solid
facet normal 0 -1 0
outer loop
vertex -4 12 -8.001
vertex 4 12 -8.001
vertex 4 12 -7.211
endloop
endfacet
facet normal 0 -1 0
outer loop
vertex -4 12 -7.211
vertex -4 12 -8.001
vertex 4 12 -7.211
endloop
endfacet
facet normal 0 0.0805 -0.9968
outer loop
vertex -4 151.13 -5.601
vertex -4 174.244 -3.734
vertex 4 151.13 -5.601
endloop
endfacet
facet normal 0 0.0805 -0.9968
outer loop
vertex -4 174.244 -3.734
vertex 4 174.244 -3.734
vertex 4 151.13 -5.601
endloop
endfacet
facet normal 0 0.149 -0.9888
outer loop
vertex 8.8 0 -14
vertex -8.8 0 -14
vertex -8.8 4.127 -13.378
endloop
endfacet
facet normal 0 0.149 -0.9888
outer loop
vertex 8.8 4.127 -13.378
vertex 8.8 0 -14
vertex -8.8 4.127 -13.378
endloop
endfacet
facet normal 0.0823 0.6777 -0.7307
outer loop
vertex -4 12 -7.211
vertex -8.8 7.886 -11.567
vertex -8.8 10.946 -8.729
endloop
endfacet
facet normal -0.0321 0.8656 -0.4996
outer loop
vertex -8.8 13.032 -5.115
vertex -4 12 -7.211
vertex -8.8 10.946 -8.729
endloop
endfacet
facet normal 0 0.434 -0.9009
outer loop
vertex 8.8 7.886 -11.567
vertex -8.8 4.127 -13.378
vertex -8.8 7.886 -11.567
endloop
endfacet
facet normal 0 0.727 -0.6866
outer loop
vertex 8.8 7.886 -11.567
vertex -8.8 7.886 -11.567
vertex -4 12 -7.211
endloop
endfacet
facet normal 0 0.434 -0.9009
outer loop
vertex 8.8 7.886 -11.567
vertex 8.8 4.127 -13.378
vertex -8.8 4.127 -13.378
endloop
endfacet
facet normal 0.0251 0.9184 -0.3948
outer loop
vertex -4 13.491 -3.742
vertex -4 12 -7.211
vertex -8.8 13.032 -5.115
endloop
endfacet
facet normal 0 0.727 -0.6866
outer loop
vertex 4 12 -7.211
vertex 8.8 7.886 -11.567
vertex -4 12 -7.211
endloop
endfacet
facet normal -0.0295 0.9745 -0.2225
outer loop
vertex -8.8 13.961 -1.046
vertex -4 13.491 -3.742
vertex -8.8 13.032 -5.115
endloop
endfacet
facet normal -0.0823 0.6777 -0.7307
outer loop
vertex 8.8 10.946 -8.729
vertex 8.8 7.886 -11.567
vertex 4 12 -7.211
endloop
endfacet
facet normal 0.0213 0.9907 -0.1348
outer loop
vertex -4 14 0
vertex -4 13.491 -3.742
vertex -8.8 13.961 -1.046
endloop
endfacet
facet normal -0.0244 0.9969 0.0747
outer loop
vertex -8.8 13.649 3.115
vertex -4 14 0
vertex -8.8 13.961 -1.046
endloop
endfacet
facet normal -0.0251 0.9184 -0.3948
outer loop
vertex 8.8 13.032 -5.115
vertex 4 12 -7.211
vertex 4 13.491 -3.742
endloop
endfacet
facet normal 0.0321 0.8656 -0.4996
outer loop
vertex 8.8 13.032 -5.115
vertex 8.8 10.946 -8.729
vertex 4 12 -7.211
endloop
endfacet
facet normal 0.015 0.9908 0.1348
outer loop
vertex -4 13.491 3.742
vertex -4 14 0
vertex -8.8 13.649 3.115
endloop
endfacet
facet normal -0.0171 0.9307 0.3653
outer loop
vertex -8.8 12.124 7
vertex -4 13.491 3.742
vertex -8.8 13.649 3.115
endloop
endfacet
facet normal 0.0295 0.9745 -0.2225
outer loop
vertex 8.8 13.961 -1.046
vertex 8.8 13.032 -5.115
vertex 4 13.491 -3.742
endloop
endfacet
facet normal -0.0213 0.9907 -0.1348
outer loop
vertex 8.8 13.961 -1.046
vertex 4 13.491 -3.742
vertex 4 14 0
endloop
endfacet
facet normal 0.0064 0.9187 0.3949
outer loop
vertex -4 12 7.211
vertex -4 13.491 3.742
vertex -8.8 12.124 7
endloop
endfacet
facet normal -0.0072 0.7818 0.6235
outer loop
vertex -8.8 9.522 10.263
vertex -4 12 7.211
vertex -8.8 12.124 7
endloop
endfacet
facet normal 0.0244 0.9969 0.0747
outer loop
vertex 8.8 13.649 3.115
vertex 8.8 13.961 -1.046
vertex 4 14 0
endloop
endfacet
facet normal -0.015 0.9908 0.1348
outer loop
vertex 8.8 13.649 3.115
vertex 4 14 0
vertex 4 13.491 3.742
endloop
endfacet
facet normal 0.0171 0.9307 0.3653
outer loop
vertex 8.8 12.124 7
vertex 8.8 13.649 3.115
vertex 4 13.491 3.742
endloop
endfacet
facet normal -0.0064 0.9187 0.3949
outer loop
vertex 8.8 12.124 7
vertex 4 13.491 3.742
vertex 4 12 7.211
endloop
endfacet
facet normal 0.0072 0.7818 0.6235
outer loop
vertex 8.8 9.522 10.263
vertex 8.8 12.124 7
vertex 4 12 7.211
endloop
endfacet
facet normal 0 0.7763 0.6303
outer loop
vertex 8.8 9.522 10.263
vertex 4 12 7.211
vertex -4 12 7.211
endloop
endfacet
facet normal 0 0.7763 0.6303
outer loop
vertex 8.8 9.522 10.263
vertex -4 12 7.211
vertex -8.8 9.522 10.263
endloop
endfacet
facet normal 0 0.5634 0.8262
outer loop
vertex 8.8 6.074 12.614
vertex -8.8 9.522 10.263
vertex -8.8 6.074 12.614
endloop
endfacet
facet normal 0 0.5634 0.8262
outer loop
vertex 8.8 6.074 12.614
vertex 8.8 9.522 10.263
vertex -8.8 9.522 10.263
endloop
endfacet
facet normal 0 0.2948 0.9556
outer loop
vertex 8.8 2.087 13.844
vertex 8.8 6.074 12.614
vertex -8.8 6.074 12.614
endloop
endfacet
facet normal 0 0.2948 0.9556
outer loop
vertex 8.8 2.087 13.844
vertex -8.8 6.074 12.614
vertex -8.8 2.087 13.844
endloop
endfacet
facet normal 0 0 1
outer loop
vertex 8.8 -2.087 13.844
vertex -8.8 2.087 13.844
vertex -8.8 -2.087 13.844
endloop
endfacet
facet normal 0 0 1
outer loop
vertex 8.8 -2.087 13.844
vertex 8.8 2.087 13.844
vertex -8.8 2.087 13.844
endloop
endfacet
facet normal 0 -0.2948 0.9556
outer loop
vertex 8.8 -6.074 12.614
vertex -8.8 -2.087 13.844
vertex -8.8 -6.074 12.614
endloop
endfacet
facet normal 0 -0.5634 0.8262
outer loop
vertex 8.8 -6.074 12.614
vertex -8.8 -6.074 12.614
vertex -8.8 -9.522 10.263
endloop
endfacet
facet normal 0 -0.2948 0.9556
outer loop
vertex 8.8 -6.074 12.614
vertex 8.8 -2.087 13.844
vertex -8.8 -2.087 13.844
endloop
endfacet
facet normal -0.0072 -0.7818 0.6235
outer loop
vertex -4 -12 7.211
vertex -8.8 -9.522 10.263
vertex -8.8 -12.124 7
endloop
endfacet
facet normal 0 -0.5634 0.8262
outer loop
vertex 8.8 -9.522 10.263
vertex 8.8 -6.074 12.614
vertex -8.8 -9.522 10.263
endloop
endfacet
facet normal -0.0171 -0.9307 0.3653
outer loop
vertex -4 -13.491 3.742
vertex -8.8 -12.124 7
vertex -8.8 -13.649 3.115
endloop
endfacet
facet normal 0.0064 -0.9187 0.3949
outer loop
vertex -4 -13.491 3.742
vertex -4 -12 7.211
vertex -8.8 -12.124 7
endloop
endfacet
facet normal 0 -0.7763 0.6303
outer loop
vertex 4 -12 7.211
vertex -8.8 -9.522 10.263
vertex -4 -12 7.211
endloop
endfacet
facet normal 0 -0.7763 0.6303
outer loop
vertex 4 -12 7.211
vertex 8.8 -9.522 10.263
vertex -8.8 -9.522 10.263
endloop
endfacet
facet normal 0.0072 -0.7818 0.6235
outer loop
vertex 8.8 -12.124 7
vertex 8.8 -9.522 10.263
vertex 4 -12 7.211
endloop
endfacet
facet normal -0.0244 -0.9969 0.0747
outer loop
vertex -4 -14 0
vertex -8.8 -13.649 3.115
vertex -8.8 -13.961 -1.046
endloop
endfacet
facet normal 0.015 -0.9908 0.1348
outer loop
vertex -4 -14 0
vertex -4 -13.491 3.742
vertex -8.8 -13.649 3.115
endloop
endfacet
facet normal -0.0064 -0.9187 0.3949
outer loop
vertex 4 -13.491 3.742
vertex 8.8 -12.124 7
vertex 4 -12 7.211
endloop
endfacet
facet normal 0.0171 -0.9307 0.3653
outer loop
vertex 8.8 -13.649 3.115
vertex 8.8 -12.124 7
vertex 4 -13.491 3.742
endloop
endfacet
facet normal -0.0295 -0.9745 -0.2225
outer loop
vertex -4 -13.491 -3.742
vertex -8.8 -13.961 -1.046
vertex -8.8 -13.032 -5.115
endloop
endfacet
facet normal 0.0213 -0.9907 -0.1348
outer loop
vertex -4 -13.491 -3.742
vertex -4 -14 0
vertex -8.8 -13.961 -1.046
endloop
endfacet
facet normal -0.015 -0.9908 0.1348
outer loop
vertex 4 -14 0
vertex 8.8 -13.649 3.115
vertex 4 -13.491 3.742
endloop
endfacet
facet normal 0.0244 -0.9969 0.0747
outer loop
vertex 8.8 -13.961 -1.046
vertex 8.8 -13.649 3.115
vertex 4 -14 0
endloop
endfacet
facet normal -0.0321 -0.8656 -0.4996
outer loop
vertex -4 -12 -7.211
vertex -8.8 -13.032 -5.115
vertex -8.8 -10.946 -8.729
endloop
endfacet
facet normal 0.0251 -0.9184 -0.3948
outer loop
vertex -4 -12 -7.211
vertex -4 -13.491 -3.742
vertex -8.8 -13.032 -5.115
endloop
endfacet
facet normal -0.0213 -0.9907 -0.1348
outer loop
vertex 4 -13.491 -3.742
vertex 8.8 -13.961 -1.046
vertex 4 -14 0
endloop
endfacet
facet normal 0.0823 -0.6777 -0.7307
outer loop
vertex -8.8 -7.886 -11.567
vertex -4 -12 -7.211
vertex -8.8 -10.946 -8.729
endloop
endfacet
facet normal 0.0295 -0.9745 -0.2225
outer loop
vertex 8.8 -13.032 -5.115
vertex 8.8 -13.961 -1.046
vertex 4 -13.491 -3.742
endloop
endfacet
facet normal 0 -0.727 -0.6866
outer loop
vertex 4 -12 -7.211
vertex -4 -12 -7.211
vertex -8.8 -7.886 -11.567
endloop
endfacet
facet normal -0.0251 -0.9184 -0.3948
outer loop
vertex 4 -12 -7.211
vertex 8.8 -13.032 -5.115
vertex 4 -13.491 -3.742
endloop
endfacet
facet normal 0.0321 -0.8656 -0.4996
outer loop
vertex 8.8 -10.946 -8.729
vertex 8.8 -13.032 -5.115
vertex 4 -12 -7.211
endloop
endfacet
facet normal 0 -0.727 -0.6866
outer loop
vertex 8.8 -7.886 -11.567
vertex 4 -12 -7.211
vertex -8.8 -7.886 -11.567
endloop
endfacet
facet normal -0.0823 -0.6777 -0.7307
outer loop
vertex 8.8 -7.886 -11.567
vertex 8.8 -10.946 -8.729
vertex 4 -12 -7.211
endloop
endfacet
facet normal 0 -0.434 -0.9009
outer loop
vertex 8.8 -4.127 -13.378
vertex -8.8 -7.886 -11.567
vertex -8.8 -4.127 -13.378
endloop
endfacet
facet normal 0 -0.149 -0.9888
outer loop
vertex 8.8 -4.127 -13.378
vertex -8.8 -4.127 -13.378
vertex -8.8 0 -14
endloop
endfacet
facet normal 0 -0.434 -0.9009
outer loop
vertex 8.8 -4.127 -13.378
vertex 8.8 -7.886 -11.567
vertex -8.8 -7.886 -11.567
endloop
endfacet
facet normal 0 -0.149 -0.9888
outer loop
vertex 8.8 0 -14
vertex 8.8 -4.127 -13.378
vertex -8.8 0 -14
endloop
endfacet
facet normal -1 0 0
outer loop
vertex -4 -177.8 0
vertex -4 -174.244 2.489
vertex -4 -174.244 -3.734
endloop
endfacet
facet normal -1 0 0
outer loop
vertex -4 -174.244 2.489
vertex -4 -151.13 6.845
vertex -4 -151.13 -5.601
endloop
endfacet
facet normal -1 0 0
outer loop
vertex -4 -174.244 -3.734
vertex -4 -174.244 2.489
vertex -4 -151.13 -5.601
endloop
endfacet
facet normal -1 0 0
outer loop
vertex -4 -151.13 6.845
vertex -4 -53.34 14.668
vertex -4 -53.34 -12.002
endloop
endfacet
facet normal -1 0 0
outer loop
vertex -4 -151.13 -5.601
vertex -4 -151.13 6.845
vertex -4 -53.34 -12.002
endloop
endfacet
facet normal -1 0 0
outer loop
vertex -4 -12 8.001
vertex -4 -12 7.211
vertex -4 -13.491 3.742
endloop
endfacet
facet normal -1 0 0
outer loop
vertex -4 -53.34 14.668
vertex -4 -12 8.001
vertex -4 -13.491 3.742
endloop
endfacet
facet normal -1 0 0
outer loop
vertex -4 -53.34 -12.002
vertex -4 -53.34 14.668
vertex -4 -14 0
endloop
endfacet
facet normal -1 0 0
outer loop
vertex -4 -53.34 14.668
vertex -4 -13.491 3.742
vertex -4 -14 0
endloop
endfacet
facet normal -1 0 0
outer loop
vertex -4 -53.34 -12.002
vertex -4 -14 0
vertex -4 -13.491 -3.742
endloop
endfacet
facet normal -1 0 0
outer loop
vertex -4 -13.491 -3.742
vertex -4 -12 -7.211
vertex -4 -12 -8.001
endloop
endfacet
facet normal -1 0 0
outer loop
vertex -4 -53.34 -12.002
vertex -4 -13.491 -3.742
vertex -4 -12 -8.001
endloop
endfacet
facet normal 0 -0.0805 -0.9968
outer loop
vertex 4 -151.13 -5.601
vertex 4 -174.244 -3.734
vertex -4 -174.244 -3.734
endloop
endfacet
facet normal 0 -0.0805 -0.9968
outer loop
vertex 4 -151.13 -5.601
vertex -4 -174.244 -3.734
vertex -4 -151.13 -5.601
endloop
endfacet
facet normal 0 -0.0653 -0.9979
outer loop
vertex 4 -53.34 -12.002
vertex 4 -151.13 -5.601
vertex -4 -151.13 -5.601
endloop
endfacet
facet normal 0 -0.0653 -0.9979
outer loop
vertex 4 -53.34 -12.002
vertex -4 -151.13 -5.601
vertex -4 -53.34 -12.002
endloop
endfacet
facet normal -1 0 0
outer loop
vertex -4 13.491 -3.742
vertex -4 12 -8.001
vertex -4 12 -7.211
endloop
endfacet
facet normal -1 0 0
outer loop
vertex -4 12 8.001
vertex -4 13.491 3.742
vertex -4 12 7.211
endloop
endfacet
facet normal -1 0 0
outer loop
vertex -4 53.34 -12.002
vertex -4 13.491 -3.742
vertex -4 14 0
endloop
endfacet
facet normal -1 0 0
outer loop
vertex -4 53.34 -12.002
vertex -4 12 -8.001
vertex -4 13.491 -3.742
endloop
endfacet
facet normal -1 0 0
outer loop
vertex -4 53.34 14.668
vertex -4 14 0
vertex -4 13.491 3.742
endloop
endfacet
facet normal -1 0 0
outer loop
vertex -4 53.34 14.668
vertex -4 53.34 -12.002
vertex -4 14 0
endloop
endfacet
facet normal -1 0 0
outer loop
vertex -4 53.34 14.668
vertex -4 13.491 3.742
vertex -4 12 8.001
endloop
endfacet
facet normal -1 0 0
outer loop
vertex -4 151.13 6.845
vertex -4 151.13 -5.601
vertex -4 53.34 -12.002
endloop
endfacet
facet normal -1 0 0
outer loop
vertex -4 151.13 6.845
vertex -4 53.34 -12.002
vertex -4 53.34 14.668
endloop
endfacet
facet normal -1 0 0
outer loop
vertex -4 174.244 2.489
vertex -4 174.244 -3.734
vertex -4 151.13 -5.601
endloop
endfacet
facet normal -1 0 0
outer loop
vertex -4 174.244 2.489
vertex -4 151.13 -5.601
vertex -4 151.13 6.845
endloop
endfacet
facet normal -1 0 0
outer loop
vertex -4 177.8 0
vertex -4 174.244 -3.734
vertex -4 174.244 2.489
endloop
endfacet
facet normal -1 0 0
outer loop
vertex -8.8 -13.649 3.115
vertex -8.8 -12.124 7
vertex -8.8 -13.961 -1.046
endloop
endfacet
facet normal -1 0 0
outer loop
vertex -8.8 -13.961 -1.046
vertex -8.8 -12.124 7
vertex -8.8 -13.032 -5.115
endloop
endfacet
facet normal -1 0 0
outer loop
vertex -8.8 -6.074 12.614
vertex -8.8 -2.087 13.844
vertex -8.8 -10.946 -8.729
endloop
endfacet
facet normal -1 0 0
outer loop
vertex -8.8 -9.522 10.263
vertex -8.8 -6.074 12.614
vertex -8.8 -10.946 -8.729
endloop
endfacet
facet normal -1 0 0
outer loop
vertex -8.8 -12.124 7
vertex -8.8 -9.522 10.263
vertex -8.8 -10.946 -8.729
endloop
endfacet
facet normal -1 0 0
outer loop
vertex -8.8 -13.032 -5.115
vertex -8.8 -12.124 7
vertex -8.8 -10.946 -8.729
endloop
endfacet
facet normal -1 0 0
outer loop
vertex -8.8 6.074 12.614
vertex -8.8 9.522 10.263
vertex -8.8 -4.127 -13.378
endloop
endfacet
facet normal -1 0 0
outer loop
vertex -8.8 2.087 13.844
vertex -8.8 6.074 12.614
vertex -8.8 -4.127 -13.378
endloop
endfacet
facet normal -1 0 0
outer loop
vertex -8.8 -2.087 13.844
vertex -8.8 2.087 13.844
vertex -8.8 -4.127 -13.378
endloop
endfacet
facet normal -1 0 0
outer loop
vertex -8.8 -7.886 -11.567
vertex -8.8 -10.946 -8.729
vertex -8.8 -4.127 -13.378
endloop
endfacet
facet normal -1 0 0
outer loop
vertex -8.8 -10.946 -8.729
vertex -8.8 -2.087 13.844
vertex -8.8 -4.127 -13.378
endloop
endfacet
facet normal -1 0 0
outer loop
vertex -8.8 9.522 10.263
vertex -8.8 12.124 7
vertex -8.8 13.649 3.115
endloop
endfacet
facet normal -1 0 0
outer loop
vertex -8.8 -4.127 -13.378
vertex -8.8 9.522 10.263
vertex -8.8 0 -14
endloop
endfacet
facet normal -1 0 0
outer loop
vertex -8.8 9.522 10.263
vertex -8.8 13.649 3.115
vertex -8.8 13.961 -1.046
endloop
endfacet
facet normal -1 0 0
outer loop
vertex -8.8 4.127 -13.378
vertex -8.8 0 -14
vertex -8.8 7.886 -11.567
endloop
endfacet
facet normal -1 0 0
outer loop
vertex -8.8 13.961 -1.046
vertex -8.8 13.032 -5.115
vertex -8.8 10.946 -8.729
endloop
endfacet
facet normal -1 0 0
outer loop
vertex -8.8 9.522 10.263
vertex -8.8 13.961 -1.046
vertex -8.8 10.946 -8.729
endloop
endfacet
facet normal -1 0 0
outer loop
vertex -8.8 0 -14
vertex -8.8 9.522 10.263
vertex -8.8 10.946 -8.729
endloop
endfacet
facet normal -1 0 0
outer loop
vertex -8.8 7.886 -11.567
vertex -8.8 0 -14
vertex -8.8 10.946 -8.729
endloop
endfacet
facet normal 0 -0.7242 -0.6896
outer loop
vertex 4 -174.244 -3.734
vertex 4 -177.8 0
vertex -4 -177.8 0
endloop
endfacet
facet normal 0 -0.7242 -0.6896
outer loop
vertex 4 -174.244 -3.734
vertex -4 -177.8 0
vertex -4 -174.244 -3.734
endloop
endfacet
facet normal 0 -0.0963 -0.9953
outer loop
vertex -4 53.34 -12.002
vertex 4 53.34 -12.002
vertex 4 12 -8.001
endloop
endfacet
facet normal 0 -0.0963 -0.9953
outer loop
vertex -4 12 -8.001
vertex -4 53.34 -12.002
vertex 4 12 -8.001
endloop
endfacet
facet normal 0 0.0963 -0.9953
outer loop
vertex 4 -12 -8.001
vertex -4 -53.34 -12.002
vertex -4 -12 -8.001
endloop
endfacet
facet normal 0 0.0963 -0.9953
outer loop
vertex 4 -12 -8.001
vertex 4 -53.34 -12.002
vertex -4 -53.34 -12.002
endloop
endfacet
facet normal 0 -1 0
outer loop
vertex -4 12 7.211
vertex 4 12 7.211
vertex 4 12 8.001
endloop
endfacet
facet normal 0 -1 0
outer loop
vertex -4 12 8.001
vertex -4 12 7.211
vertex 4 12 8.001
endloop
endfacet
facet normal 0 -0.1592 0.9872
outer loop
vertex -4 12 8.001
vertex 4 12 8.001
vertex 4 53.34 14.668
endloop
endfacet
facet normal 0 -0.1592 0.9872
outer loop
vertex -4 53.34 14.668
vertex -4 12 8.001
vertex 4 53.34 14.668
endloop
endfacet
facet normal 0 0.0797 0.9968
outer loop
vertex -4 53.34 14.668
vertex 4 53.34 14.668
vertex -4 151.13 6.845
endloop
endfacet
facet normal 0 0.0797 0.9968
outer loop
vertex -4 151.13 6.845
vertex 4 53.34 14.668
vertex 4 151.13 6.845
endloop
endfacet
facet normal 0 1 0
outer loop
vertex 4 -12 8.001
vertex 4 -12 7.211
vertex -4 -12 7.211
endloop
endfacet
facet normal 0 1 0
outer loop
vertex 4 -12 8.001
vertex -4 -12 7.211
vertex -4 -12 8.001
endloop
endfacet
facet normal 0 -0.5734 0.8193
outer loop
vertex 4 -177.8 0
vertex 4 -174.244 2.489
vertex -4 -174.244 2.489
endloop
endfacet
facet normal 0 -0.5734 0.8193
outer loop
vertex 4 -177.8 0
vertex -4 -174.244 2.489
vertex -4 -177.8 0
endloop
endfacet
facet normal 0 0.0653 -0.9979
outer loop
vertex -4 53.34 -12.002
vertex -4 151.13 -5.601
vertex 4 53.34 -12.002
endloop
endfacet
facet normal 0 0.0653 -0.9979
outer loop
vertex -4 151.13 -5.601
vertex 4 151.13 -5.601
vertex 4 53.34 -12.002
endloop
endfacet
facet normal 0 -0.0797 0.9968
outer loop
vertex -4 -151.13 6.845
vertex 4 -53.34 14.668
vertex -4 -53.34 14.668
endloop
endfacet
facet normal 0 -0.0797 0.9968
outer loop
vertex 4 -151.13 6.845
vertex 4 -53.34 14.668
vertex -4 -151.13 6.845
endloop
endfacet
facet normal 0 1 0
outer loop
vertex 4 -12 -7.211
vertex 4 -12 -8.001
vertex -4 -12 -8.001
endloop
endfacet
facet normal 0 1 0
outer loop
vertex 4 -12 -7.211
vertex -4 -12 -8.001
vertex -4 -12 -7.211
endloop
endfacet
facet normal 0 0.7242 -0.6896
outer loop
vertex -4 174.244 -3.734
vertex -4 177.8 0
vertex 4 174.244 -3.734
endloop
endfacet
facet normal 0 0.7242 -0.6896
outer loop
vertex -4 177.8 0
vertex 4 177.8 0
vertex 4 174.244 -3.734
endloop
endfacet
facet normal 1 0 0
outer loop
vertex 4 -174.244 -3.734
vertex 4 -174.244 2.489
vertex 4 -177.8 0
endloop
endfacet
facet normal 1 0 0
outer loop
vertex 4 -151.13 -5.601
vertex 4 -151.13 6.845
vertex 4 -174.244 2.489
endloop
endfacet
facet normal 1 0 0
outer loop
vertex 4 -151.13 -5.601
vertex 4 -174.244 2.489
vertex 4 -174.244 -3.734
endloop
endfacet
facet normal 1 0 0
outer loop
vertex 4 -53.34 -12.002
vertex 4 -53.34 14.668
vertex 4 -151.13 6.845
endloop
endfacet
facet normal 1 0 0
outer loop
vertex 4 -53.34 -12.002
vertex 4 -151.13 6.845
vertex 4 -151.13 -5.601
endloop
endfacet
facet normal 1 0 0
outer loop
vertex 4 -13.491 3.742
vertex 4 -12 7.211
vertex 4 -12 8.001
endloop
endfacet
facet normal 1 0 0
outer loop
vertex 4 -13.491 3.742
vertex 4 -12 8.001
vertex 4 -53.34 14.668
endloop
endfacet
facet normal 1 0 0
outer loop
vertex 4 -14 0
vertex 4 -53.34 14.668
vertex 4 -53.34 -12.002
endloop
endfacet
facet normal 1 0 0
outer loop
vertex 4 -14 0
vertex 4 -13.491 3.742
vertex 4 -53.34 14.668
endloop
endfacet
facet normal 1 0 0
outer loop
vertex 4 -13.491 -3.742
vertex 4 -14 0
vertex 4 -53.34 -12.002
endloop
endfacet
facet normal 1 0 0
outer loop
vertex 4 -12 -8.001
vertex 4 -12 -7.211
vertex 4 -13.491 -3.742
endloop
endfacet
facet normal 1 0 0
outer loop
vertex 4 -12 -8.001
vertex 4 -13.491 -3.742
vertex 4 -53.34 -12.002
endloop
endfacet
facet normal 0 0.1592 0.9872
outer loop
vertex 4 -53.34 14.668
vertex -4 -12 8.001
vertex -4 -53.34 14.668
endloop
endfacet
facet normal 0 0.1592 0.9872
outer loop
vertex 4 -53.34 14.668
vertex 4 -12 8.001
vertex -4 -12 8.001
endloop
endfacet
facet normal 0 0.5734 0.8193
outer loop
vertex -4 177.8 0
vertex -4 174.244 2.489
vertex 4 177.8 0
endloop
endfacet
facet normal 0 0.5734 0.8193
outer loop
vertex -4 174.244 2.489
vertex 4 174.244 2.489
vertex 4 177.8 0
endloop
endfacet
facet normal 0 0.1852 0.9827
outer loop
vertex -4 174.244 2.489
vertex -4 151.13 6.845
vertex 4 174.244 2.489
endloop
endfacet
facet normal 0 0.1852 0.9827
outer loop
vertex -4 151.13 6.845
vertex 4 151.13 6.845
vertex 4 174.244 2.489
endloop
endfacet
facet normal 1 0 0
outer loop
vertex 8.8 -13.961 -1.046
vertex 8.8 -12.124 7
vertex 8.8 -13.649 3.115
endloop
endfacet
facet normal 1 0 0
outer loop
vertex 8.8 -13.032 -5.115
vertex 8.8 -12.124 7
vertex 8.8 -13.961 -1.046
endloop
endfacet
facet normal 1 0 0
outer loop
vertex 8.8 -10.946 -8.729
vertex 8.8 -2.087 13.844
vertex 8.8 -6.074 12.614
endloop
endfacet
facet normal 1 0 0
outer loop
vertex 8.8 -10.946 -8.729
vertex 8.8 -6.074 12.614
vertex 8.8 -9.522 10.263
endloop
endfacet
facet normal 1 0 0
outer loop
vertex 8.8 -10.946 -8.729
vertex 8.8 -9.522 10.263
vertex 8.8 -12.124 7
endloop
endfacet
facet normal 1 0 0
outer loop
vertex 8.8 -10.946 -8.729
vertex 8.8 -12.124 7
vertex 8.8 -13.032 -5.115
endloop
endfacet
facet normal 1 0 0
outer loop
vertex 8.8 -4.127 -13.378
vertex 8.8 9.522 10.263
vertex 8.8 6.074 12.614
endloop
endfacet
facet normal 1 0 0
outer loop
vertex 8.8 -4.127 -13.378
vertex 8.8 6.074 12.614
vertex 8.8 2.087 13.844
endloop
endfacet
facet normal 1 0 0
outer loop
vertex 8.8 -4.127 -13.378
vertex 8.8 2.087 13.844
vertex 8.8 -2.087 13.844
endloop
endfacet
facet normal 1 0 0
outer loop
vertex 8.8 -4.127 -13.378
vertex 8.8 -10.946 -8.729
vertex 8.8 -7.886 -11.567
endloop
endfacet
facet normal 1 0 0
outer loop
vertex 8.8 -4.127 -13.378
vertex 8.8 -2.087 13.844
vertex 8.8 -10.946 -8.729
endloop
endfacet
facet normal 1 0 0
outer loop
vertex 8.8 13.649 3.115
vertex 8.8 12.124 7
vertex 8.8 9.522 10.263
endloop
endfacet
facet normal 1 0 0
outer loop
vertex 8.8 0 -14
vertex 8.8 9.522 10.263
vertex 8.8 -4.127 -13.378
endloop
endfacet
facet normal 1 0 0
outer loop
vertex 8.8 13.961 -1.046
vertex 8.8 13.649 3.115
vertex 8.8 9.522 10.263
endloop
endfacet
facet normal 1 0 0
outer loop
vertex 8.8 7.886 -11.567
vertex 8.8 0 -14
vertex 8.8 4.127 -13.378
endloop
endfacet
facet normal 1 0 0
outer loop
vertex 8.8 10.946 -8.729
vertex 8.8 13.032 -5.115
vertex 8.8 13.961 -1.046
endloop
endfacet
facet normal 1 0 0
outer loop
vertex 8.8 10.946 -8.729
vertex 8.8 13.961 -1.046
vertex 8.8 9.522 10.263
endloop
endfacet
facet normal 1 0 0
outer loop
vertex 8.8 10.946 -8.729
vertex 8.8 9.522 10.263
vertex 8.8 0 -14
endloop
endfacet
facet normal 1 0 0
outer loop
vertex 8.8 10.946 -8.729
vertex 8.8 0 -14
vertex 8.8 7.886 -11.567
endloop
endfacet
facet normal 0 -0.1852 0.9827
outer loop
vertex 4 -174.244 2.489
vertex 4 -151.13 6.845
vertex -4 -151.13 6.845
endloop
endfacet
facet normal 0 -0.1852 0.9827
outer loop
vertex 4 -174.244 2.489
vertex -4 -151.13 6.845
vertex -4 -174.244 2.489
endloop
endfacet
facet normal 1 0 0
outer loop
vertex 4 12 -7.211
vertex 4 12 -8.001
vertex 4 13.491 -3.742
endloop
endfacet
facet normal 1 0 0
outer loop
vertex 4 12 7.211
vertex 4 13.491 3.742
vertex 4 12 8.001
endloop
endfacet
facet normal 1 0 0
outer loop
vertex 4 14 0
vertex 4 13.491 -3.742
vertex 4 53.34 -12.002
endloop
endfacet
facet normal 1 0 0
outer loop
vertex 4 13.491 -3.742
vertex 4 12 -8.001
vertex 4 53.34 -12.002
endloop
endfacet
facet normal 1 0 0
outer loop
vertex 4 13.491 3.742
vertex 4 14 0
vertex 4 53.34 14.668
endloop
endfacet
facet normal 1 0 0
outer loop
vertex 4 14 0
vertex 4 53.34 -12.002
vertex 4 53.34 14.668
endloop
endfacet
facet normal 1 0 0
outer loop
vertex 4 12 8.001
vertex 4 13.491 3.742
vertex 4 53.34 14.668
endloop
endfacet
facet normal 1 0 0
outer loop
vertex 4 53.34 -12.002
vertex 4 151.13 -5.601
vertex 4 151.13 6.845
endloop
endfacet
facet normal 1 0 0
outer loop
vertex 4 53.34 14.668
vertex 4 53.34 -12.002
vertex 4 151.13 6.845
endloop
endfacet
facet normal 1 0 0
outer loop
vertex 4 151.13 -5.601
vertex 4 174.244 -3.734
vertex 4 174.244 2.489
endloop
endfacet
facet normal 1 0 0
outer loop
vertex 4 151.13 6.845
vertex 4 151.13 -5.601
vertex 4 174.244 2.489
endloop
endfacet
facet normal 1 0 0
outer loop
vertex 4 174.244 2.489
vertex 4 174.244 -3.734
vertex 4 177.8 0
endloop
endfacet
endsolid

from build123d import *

# Parameters (mm, degrees)
BOSS_EXTRUDE1_DEPTH   = 4
BOSS_EXTRUDE1_2_DEPTH = 4
SKETCH2_R             = 14
BOSS_EXTRUDE2_DEPTH   = 8.8


with BuildPart() as part:
    # Sketch1 → Boss-Extrude1 (new, symmetric)
    with BuildSketch(Plane(origin=(0, 0, 0), x_dir=(0, 0, -1), z_dir=(1, 0, 0))):
        Polygon((-8.001, 12), (-14.6685, 53.34), (-6.8453, 151.13), (-2.4892, 174.244), (0, 177.8), (3.7338, 174.244), (5.6007, 151.13), (12.0015, 53.34), (8.001, 12), align=None)
    extrude(amount=BOSS_EXTRUDE1_DEPTH, both=True)



with BuildPart() as body_2:
    # Sketch1 → Boss-Extrude1 2 (new, symmetric)
    with BuildSketch(Plane(origin=(0, 0, 0), x_dir=(0, 0, -1), z_dir=(1, 0, 0))):
        Polygon((-8.001, -12), (-14.6685, -53.34), (-6.8453, -151.13), (-2.4892, -174.244), (0, -177.8), (3.7338, -174.244), (5.6007, -151.13), (12.0015, -53.34), (8.001, -12), align=None)
    extrude(amount=BOSS_EXTRUDE1_2_DEPTH, both=True)


with BuildPart() as part_1:
    add(part.part)

    add(body_2.part)  # Boss-Extrude2 merges body 2
    # Sketch2 → Boss-Extrude2 (add, symmetric)
    with BuildSketch(Plane(origin=(0, 0, 0), x_dir=(0, 0, -1), z_dir=(1, 0, 0))):
        Circle(SKETCH2_R)
    extrude(amount=BOSS_EXTRUDE2_DEPTH, both=True)


solid = part_1.part
